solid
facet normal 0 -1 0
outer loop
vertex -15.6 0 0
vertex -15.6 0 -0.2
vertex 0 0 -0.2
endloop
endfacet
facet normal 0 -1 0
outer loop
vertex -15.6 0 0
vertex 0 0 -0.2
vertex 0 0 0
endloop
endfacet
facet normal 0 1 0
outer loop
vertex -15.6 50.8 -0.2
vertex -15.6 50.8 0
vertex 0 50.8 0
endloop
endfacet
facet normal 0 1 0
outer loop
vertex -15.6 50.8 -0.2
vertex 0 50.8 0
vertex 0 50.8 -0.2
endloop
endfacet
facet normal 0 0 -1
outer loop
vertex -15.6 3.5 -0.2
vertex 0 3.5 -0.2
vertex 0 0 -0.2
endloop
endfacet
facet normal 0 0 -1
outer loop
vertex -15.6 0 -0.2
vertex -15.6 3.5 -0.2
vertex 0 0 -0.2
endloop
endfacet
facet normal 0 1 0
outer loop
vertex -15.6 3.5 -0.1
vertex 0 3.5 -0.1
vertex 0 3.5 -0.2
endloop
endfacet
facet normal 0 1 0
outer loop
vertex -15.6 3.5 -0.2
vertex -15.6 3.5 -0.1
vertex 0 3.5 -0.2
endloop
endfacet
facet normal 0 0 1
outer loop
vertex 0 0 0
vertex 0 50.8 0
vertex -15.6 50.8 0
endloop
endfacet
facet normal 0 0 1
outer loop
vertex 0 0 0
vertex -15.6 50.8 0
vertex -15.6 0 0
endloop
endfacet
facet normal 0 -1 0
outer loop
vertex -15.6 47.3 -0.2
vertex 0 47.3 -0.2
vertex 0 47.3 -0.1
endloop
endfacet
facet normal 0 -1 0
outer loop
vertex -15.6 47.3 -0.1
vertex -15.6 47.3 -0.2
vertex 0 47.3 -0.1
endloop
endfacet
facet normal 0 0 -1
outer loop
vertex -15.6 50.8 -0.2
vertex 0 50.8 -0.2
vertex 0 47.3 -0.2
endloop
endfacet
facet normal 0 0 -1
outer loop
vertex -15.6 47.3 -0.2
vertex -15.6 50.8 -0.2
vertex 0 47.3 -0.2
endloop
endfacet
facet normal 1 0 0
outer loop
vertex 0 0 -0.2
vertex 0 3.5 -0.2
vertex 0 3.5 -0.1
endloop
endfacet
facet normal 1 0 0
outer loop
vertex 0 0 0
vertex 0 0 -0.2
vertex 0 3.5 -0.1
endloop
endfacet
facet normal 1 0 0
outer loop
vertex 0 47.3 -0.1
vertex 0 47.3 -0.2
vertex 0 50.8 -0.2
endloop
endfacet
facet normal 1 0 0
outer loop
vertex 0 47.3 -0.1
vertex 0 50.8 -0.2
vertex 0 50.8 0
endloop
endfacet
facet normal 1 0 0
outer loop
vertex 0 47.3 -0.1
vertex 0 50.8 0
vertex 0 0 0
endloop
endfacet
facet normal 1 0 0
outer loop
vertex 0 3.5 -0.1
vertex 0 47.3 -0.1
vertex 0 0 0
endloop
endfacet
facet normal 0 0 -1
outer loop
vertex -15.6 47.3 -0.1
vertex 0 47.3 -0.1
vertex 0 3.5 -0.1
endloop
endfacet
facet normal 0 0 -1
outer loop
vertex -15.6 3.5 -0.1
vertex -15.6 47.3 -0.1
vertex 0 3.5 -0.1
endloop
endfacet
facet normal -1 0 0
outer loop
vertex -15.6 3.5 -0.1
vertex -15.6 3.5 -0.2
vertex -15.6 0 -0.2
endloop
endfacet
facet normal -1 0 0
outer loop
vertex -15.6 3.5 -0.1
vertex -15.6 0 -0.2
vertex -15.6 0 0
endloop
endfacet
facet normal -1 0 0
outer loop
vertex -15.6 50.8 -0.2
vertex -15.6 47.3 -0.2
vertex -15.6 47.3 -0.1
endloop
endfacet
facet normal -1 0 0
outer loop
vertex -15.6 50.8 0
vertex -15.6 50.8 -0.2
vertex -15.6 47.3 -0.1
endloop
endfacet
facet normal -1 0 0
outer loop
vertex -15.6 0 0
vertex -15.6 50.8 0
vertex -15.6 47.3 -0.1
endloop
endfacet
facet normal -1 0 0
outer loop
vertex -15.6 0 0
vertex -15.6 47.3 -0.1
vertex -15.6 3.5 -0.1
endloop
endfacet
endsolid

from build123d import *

# Parameters (mm, degrees)
BOSS_EXTRUDE1_DEPTH = 15.6


with BuildPart() as part:
    # Sketch2 → Boss-Extrude1 (new body)
    with BuildSketch(Plane(origin=(0, 0, 0), x_dir=(0, 0, -1), z_dir=(1, 0, 0))):
        Polygon((0.2, 47.3), (0.1, 47.3), (0.1, 3.5), (0.2, 3.5), (0.2, 0), (0, 0), (0, 3.5), (0, 47.3), (0, 50.8), (0.2, 50.8), align=None)
    extrude(amount=-BOSS_EXTRUDE1_DEPTH)


solid = part.part
